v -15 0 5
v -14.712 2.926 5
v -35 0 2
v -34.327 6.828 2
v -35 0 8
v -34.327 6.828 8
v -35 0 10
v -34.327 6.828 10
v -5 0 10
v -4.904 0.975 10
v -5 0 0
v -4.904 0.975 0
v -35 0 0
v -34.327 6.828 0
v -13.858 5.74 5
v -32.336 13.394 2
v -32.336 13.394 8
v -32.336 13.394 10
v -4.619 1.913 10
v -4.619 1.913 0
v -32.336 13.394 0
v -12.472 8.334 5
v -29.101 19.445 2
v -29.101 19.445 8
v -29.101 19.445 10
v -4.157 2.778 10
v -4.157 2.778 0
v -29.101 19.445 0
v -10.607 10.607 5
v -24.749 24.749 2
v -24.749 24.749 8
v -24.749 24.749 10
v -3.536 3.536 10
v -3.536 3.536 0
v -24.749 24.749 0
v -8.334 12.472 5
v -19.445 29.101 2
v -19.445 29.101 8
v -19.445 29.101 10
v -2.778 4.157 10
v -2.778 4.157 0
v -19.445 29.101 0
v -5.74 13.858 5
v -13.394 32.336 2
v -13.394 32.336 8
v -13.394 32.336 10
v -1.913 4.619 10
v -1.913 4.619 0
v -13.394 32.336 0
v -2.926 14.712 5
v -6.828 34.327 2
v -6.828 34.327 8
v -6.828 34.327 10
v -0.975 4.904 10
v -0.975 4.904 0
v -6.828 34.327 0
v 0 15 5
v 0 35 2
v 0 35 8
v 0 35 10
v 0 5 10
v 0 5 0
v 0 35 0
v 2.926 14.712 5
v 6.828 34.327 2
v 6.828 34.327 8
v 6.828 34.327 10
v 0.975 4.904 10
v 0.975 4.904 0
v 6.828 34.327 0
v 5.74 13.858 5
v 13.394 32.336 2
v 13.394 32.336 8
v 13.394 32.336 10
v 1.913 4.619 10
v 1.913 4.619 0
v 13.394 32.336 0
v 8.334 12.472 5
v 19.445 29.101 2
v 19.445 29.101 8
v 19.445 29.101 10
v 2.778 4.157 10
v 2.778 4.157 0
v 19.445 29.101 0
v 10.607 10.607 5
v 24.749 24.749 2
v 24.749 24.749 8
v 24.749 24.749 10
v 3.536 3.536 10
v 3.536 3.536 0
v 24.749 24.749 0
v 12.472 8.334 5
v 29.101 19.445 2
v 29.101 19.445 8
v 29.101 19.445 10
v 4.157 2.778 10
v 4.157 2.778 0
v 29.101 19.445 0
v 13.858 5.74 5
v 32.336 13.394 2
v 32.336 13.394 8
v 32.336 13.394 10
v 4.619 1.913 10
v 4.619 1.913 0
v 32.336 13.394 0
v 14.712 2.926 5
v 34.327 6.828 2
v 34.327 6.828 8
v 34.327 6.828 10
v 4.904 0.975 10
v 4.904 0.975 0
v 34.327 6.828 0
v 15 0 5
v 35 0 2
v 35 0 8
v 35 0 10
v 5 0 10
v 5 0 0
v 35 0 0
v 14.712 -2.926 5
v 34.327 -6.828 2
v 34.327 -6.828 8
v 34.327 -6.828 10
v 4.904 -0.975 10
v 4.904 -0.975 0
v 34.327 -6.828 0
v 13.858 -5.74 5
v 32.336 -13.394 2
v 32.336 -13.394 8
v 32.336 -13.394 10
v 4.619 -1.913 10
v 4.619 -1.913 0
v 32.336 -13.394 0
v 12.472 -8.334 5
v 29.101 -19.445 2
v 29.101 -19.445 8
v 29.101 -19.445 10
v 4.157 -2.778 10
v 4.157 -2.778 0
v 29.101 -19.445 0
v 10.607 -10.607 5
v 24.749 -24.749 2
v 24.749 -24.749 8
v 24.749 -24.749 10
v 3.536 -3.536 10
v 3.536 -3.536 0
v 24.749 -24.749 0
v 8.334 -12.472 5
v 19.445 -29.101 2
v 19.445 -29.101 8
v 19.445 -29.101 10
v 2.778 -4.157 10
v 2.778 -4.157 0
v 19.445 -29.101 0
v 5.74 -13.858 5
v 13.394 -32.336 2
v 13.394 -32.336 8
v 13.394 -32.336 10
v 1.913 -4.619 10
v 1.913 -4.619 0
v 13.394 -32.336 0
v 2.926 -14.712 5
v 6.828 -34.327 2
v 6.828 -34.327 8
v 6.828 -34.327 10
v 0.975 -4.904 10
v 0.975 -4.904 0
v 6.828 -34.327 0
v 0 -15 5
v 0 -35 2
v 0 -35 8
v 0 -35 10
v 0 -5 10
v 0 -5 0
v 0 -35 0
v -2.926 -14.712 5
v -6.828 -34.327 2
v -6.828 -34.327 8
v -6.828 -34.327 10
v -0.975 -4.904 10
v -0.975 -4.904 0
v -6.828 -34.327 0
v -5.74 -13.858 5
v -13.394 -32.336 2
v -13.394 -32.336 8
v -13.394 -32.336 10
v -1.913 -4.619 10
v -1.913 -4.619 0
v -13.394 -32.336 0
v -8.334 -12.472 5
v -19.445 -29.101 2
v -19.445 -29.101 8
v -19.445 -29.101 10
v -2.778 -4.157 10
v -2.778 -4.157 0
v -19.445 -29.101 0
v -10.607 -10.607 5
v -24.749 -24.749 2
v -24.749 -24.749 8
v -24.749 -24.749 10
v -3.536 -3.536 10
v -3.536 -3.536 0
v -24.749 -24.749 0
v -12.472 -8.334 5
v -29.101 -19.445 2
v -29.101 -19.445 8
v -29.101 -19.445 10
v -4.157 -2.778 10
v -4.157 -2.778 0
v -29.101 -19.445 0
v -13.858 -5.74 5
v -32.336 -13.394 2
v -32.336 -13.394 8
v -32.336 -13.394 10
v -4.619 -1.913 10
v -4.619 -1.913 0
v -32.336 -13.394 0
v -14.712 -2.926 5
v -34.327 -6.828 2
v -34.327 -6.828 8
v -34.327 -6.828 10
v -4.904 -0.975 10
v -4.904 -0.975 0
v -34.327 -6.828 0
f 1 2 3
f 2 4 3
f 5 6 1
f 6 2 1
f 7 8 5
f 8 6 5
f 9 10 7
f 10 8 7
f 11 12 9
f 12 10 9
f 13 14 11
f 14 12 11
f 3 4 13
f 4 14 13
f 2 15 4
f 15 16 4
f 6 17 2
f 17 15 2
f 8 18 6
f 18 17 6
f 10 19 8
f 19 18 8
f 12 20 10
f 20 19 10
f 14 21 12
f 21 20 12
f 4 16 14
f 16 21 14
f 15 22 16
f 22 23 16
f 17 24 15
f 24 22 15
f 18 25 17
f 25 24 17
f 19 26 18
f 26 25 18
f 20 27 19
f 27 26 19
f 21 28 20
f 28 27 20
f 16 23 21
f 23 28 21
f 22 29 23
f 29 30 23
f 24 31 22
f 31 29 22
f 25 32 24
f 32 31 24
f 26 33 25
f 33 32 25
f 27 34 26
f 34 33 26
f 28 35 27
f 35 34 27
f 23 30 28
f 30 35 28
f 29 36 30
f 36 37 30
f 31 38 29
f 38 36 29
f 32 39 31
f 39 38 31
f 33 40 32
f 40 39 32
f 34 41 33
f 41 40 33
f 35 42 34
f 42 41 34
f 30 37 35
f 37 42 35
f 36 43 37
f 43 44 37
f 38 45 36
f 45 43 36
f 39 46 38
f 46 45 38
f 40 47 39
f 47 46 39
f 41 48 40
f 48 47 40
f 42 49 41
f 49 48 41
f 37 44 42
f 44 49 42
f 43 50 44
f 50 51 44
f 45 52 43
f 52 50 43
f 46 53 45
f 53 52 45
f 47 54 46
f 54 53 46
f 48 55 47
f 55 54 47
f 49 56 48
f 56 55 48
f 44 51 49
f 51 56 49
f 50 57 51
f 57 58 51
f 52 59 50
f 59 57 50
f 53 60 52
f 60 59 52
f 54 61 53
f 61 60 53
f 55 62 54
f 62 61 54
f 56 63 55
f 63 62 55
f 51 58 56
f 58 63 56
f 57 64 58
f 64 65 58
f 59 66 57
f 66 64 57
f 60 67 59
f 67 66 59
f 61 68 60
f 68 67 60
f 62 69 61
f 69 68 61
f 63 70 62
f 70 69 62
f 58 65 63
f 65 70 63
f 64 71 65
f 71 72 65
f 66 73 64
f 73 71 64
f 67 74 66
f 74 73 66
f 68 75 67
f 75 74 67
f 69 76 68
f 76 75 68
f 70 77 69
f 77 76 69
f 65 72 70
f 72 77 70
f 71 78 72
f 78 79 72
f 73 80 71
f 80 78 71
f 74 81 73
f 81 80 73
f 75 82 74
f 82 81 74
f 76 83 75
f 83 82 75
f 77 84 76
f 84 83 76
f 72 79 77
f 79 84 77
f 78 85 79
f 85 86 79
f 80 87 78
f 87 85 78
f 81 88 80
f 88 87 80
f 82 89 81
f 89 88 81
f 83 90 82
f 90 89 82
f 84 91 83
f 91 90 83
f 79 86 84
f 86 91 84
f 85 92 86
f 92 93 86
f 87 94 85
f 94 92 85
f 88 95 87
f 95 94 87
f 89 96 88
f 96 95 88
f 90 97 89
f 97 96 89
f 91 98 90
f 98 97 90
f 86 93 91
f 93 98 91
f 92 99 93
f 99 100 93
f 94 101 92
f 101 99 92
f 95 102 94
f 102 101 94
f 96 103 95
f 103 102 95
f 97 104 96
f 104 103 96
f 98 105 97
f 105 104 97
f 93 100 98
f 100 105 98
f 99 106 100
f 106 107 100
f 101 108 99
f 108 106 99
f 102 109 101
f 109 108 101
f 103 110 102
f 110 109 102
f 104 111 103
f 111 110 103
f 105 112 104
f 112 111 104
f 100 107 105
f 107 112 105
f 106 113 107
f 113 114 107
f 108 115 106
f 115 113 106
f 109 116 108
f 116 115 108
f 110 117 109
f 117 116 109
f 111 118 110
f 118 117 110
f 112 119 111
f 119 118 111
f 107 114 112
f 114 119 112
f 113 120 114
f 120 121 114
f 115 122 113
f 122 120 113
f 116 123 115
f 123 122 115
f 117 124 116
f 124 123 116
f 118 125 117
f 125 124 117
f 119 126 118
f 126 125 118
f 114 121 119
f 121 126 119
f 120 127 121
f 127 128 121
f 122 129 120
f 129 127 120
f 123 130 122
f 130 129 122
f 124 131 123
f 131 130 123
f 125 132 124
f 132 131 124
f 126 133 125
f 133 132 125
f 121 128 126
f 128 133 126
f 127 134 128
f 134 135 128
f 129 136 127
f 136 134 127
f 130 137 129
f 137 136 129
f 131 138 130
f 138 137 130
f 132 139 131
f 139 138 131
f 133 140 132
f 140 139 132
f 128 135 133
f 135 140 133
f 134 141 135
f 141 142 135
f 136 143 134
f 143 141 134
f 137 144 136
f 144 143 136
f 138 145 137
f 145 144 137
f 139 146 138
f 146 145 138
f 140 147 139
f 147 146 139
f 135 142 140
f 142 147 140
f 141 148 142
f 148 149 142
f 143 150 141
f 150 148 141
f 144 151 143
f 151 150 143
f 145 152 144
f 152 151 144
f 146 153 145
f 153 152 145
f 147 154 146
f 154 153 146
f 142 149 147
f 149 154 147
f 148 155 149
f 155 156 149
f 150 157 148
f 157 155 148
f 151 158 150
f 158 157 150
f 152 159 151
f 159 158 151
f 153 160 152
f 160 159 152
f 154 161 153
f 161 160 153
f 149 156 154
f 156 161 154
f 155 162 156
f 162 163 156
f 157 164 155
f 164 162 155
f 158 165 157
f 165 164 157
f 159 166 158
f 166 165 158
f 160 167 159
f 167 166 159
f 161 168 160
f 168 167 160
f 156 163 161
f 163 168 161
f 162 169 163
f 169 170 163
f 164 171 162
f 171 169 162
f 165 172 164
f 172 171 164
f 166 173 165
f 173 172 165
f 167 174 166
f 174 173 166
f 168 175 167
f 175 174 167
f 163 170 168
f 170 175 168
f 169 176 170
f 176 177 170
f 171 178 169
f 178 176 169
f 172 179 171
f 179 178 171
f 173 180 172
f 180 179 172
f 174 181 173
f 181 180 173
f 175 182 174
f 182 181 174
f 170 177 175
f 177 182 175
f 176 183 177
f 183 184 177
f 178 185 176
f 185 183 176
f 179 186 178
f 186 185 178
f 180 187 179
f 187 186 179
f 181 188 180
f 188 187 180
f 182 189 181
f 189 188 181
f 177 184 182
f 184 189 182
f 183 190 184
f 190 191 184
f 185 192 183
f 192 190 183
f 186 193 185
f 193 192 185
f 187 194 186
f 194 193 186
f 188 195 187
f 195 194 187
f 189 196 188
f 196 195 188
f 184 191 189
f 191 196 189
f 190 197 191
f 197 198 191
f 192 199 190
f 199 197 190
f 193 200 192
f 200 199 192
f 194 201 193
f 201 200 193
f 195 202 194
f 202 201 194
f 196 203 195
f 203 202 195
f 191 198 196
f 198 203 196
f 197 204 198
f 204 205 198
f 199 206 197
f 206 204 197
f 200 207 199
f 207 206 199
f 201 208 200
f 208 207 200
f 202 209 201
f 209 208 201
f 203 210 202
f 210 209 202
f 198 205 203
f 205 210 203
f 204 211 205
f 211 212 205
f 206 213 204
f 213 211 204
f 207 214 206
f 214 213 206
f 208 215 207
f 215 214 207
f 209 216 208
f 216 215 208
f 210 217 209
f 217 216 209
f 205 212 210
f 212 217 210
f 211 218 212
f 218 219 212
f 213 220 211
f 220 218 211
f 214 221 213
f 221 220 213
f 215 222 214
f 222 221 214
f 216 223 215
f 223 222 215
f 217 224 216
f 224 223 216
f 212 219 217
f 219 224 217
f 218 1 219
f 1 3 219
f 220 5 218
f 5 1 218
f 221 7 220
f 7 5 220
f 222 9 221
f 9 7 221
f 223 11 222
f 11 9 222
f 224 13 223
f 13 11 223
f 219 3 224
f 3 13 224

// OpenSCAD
$fn = 32;

// ----------------------------------------------------------------------
// Revolved part: V-groove pulley R35
// ----------------------------------------------------------------------

// --- parameters (mm) ---
bore_r = 5;               // bore radius
rim_r = 35;               // rim radius
rim_t = 10;               // rim width
groove_r = 15;            // groove root radius
groove_w = 3;             // groove half width
revolve_angle = 360;      // revolve sweep, degrees

bore_d = 2 * bore_r;
rim_d = 2 * rim_r;
groove_d = 2 * groove_r;

profile = [[5, 0], [35, 0], [35, 2], [15, 5], [35, 8], [35, 10], [5, 10]];  // primary outline, 7 points, counter clockwise

// --- the one profile operation ---
rotate_extrude(angle = revolve_angle) polygon(points = profile);
